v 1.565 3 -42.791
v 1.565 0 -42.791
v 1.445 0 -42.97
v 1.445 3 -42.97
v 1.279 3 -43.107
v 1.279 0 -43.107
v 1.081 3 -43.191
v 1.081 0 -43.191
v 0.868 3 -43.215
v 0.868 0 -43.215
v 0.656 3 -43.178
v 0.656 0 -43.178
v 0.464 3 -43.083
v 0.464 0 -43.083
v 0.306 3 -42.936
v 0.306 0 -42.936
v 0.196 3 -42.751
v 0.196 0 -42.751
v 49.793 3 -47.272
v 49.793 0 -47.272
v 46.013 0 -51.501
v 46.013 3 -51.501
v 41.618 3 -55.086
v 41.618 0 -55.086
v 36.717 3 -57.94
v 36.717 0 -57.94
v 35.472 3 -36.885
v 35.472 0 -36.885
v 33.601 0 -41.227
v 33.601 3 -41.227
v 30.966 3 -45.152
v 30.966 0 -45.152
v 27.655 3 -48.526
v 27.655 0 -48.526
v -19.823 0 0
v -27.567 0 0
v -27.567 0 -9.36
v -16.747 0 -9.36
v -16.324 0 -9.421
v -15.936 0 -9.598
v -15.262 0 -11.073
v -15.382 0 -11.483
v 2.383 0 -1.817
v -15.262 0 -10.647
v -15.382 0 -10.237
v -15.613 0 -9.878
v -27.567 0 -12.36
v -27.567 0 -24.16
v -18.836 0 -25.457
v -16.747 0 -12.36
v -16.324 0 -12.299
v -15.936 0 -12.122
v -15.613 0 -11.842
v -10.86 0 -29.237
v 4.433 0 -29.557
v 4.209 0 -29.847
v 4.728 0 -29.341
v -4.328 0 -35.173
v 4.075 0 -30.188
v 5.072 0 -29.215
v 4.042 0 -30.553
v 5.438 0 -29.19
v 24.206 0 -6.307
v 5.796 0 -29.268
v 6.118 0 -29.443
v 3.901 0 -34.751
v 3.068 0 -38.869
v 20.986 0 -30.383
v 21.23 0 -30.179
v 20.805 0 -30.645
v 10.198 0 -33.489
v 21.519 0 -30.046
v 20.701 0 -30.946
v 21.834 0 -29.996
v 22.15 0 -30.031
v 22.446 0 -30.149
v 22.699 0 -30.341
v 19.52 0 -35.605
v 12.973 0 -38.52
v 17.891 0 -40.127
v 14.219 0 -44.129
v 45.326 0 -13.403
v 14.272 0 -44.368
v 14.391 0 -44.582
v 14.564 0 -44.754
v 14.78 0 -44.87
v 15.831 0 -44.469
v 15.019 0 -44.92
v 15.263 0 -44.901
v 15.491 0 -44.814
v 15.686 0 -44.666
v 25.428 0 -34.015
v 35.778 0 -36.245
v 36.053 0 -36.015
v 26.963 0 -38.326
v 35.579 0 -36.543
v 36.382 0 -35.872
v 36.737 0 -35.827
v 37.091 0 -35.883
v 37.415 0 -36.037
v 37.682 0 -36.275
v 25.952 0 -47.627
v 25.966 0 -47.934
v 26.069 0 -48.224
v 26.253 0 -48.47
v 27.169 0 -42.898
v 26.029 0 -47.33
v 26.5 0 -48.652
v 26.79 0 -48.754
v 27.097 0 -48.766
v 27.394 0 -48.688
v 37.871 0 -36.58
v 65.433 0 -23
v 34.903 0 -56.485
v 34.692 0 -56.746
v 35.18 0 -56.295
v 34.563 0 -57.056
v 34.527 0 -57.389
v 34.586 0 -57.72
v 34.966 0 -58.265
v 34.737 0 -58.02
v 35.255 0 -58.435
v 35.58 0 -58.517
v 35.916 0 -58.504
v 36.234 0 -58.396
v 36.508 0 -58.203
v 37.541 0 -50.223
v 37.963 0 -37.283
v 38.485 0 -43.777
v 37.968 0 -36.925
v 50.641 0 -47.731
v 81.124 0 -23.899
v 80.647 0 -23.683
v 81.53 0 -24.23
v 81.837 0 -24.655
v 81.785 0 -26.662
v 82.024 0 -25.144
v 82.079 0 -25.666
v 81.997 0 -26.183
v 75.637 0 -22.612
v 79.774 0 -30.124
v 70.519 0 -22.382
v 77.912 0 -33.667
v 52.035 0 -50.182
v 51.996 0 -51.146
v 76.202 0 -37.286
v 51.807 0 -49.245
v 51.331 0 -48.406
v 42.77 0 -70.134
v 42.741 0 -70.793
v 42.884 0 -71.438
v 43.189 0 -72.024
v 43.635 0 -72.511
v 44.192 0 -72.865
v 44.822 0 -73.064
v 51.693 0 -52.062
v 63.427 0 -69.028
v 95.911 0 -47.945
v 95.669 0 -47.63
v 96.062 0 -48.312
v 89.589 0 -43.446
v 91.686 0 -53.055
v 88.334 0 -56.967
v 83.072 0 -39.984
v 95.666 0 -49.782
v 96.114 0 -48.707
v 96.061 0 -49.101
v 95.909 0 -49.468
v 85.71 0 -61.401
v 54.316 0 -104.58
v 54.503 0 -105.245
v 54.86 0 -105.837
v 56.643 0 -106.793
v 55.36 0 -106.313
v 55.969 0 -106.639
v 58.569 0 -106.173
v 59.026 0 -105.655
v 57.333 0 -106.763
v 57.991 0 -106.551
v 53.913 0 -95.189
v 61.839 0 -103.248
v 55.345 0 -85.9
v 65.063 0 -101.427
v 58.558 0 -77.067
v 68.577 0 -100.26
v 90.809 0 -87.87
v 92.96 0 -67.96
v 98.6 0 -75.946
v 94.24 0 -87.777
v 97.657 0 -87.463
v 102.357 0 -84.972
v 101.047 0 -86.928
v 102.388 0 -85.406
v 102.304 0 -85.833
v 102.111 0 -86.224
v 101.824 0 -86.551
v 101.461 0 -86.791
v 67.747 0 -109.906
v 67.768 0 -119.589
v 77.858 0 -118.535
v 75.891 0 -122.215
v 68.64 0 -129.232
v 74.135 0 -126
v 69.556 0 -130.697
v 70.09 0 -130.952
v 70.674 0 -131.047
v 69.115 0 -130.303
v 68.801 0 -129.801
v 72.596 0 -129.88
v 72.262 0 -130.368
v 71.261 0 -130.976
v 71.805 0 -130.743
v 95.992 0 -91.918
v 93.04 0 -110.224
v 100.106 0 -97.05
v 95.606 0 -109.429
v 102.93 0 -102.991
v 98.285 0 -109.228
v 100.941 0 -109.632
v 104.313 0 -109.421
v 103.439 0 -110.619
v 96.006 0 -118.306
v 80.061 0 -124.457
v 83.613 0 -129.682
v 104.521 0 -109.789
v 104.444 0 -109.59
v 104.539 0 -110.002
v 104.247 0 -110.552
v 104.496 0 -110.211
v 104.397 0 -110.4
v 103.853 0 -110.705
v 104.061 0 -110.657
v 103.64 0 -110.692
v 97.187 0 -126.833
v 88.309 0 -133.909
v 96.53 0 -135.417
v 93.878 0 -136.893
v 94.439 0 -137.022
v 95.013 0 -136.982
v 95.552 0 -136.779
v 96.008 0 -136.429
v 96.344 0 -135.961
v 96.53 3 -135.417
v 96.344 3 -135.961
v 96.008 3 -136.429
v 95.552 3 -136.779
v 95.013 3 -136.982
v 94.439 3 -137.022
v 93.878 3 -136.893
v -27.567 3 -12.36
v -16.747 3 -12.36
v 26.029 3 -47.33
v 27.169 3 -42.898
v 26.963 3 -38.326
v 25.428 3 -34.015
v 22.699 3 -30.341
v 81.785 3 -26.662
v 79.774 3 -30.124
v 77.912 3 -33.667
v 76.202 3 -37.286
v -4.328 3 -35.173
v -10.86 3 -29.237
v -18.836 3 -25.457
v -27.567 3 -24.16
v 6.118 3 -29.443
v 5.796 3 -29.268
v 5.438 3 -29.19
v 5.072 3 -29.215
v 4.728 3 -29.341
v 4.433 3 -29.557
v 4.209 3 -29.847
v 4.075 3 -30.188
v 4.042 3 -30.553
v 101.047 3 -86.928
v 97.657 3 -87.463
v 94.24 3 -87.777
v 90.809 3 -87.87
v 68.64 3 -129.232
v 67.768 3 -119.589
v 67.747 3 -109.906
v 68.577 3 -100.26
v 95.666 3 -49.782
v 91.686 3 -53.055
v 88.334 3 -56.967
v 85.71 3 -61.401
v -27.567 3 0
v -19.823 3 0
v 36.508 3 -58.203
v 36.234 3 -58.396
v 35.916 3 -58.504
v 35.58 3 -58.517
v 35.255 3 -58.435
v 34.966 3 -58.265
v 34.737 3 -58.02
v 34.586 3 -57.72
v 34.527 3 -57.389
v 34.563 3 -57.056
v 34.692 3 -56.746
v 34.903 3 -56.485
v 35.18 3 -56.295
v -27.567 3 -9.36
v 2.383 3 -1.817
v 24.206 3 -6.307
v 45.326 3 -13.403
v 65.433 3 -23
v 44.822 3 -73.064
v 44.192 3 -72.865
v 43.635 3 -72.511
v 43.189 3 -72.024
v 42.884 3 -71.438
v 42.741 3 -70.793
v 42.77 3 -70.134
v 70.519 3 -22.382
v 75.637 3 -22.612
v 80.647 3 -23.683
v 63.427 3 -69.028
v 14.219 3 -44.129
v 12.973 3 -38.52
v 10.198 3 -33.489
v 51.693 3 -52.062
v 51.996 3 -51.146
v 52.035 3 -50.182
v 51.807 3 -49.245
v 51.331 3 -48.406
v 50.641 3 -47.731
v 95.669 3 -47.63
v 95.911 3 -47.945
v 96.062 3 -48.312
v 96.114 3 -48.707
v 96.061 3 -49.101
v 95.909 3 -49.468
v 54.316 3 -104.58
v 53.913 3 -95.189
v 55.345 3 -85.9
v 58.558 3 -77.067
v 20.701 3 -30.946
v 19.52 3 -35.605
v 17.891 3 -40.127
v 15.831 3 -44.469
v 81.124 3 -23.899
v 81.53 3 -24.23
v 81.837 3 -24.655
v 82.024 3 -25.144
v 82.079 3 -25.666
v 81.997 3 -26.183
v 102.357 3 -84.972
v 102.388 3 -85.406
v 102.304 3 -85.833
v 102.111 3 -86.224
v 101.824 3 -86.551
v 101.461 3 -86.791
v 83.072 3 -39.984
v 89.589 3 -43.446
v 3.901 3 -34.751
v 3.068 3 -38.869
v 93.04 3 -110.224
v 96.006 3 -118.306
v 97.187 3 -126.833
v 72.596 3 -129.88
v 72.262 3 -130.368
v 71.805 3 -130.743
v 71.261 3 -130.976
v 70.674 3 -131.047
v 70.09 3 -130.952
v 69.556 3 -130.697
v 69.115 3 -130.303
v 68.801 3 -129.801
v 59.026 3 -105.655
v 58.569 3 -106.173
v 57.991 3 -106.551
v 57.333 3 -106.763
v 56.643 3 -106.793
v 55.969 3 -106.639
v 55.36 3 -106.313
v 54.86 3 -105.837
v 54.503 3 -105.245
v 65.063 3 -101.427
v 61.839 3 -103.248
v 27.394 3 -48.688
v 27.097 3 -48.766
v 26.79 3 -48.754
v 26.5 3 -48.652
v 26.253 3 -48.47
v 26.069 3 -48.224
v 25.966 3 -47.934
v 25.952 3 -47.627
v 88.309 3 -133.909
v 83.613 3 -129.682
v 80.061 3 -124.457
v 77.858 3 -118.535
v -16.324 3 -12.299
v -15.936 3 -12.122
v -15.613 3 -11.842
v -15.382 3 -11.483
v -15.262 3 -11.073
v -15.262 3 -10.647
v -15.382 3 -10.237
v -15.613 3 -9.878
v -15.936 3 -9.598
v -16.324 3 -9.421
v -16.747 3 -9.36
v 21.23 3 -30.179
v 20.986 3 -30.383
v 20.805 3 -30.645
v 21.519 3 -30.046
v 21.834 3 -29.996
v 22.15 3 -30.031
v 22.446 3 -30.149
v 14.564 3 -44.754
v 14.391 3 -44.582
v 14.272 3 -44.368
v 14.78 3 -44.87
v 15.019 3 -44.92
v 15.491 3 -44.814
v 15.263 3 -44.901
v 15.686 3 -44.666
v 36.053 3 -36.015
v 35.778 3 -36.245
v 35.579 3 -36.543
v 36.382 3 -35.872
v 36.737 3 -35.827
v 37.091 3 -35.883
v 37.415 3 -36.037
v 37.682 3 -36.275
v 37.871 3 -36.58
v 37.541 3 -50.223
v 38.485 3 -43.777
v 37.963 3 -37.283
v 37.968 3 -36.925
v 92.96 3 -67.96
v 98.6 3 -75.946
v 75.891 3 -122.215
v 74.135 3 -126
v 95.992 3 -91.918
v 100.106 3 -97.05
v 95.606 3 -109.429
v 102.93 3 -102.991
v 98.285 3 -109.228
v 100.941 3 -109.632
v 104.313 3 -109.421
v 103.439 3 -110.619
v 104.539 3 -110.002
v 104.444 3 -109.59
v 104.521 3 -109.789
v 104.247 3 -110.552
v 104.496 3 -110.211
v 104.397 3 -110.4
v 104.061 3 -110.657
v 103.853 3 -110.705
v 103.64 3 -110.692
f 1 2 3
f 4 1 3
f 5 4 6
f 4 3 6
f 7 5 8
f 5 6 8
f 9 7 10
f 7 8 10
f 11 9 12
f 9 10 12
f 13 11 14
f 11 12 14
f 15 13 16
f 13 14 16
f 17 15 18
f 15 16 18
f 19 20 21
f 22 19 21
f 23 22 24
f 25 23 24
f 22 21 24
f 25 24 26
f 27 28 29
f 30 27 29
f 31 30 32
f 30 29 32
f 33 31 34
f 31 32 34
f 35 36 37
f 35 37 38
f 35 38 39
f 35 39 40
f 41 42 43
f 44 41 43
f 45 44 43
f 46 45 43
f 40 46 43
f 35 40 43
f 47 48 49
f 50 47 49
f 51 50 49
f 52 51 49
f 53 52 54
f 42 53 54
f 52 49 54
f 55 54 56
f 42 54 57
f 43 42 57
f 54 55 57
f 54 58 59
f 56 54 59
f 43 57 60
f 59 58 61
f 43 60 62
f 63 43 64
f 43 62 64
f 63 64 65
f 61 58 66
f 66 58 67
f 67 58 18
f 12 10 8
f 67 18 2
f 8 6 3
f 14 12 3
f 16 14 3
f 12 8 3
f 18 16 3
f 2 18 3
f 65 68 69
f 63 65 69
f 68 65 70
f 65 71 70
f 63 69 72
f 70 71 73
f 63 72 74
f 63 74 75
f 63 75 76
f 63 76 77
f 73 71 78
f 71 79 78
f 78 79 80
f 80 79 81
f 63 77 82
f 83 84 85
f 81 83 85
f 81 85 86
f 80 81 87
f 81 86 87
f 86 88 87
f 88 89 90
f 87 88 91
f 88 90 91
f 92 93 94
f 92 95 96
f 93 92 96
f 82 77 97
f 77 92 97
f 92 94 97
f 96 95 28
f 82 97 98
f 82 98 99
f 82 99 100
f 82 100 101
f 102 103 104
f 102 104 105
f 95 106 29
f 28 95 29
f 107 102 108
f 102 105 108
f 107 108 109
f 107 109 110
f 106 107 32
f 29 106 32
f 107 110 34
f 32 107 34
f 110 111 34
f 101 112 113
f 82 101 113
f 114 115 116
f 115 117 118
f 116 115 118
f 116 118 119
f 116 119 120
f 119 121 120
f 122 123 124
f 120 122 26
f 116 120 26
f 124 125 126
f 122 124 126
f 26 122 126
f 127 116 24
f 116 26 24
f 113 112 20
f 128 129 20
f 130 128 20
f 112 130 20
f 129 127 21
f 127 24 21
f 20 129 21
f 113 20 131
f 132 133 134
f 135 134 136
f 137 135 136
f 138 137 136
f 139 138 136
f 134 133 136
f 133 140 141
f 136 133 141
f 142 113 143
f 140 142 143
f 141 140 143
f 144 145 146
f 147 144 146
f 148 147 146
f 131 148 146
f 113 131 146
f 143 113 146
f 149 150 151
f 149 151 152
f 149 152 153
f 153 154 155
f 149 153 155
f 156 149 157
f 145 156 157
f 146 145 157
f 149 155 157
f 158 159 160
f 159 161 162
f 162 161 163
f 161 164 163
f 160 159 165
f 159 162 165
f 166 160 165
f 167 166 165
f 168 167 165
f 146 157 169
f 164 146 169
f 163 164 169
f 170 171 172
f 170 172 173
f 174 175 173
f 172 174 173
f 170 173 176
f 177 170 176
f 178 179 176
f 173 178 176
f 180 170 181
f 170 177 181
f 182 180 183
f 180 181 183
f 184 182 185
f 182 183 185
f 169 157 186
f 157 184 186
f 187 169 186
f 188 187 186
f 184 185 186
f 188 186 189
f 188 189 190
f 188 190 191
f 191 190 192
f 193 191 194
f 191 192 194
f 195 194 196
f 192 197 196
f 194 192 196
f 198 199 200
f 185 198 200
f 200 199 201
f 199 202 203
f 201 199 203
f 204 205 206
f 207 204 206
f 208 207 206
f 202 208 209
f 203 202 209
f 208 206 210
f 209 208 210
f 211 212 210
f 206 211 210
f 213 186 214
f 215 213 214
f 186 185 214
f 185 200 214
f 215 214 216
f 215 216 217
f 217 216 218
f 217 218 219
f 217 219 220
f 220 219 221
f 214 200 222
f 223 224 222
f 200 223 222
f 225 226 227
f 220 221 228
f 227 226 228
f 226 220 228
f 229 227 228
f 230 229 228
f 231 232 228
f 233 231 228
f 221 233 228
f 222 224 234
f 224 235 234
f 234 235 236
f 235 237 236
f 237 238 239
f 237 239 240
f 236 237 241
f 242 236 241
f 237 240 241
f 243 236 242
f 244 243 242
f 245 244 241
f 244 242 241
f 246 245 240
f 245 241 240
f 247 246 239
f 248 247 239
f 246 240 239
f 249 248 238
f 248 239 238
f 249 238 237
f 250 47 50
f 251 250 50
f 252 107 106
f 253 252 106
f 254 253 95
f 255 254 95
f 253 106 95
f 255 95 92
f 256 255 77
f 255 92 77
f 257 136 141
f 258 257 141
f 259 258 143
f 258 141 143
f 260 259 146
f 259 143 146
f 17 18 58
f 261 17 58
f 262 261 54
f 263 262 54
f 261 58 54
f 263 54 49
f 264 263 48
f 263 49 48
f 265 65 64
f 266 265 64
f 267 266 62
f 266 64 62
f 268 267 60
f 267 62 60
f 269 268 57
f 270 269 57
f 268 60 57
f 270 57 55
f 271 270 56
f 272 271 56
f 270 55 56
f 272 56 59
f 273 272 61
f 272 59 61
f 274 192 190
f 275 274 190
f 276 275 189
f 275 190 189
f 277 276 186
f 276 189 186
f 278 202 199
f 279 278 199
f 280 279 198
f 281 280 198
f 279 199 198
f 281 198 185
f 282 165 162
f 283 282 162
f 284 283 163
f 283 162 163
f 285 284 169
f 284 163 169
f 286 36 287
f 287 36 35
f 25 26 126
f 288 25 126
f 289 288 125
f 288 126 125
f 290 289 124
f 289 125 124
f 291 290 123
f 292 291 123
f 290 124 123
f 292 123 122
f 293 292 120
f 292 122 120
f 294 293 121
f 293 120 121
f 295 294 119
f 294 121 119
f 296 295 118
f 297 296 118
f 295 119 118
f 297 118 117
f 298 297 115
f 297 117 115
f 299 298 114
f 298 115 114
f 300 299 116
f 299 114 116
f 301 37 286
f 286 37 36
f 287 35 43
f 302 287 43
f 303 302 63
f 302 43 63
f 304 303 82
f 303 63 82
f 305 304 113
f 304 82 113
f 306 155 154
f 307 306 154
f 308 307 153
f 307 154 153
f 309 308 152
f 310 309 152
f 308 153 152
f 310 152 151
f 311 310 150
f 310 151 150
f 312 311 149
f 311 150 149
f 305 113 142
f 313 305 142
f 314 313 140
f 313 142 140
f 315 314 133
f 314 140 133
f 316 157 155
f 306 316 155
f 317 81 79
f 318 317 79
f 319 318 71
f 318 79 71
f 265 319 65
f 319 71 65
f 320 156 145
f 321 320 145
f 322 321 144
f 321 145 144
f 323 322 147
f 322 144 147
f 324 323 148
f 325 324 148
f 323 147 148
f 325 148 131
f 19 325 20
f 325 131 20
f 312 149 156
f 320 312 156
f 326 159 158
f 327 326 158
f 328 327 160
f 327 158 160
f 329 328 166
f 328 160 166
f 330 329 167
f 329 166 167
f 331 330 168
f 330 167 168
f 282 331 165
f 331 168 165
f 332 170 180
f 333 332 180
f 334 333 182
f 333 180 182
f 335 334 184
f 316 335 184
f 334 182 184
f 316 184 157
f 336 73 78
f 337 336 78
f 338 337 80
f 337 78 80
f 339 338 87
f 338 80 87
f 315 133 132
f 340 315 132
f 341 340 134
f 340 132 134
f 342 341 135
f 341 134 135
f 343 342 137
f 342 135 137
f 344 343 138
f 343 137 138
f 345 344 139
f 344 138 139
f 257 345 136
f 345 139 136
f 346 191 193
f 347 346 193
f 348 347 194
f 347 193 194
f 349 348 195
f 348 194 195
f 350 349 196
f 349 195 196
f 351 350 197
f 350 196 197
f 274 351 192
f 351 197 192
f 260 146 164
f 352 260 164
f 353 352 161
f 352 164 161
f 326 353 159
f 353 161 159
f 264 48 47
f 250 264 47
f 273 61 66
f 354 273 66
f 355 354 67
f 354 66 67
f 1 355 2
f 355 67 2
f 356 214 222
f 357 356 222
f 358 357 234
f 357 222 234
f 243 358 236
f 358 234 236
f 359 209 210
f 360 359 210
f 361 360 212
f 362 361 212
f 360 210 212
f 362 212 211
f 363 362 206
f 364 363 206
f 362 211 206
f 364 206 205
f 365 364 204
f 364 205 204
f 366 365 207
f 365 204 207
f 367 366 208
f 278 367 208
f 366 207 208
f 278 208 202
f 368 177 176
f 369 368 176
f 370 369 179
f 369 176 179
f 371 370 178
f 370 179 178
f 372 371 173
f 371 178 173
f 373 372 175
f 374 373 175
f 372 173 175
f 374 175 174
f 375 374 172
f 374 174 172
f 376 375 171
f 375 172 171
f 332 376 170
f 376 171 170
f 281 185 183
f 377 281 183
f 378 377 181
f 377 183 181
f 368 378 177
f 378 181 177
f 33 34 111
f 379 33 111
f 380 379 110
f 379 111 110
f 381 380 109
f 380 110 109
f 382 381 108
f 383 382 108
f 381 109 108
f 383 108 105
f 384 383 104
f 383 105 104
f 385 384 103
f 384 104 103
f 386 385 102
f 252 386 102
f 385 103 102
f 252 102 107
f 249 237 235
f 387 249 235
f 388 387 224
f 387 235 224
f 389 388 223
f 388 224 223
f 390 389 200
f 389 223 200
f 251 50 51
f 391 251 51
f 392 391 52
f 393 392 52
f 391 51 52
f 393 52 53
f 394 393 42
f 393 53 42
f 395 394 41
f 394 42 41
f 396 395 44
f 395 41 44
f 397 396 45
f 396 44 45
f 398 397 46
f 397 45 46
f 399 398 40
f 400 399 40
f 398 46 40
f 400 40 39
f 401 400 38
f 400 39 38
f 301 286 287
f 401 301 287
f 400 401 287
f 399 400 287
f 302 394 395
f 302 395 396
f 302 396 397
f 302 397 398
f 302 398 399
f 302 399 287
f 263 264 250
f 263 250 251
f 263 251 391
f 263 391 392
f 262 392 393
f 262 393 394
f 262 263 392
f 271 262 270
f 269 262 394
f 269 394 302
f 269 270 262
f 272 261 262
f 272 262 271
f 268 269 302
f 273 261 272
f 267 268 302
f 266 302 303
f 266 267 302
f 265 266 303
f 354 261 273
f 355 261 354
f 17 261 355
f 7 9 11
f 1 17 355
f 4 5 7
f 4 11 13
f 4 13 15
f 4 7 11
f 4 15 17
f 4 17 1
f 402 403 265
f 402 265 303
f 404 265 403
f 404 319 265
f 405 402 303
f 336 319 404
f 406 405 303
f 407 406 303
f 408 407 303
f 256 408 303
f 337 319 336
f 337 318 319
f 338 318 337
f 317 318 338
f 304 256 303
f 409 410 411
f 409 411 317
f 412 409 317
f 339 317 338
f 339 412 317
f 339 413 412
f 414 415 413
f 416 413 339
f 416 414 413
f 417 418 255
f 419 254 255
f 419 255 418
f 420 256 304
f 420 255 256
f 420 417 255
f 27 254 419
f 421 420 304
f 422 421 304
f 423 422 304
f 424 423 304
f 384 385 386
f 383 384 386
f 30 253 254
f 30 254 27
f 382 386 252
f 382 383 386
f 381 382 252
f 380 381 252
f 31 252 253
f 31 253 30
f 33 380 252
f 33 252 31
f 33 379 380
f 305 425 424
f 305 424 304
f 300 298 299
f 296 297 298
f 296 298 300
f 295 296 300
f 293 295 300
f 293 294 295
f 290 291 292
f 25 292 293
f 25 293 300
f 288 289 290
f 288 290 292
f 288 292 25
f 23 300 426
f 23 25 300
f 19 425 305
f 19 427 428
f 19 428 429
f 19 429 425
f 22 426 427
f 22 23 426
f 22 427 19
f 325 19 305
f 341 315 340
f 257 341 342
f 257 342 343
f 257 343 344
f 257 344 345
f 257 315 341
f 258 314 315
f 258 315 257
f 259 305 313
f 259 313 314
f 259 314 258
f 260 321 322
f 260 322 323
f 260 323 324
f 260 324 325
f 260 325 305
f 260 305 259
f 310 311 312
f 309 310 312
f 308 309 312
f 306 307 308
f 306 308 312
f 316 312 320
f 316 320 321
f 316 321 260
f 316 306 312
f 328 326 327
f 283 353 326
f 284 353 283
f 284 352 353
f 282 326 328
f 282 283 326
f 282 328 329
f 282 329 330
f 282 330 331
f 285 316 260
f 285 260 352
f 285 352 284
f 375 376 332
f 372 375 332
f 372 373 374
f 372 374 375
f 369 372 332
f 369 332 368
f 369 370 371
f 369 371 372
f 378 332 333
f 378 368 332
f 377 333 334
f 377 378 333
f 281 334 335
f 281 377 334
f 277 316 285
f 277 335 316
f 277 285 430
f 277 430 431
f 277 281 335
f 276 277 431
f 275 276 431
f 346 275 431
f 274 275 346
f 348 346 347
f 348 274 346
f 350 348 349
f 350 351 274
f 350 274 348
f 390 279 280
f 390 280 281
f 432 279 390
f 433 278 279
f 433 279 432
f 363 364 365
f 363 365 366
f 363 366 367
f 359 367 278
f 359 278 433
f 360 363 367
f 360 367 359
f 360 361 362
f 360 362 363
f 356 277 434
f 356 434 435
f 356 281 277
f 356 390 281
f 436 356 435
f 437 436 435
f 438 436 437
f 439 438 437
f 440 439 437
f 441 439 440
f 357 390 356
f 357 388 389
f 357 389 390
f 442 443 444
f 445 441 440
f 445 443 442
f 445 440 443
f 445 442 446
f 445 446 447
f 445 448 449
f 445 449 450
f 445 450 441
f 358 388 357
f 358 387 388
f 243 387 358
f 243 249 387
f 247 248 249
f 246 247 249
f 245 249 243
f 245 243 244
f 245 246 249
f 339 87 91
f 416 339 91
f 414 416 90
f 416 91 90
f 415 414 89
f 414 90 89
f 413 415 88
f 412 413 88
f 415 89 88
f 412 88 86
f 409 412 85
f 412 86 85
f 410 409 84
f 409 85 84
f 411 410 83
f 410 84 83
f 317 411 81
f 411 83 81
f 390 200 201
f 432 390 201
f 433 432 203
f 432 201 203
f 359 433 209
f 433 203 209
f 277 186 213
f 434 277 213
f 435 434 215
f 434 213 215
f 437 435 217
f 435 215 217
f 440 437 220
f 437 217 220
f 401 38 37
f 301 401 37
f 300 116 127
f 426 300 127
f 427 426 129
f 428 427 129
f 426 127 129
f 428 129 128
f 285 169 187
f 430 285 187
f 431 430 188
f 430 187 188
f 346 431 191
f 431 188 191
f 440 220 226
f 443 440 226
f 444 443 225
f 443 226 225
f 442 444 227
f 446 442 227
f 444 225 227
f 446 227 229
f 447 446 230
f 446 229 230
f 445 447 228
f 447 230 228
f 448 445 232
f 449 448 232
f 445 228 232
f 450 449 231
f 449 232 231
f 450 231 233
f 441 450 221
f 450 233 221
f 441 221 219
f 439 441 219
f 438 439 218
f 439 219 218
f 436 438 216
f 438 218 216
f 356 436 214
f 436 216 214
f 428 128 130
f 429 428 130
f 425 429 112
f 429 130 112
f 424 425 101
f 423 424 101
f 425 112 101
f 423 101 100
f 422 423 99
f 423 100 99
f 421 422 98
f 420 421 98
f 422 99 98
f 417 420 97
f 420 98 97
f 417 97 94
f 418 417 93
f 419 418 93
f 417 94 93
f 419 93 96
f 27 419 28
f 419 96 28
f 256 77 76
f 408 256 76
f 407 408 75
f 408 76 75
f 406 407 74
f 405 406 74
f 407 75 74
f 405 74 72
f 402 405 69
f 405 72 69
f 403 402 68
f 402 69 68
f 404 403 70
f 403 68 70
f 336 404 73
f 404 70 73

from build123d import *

# Parameters (mm, degrees)
BOSS_EXTRUDE1_DEPTH = 3


with BuildPart() as part:
    # Sketch1 → Boss-Extrude1 (new body)
    with BuildSketch(Plane(origin=(0, 0, 0), x_dir=(1, 0, 0), z_dir=(0, 1, 0))):
        with BuildLine():
            Line((-27.566533023, 9.36), (-27.566533023, 0))
            Line((-27.566533023, 0), (-19.823403694, 0))
            ThreePointArc((-19.823403694, 0), (24.20597109, 6.306968985), (65.433466977, 23))
            ThreePointArc((65.433466977, 23), (73.082886665, 22.390495512), (80.646880945, 23.683208869))
            ThreePointArc((80.646880945, 23.683208869), (81.946672363, 24.893615616), (81.784737476, 26.662321164))
            ThreePointArc((81.784737476, 26.662321164), (78.82438559, 31.885442154), (76.202135766, 37.28622747))
            ThreePointArc((76.202135766, 37.28622747), (86.37958616, 41.621825), (95.668579031, 47.629529544))
            ThreePointArc((95.668579031, 47.629529544), (96.113926531, 48.706505439), (95.666017221, 49.782418412))
            ThreePointArc((95.666017221, 49.782418412), (89.924608564, 54.937742393), (85.709789242, 61.401211803))
            ThreePointArc((85.709789242, 61.401211803), (96.000732533, 71.797200989), (102.357305132, 84.971952969))
            ThreePointArc((102.357305132, 84.971952969), (102.11128314, 86.223857216), (101.047487459, 86.928222044))
            ThreePointArc((101.047487459, 86.928222044), (95.950995205, 87.647987285), (90.808707622, 87.869738741))
            ThreePointArc((90.808707622, 87.869738741), (100.106213422, 97.05037675), (104.313081391, 109.420905852))
            ThreePointArc((104.313081391, 109.420905852), (104.396564886, 110.399625231), (103.439203659, 110.619444698))
            ThreePointArc((103.439203659, 110.619444698), (98.285170112, 109.227963636), (93.040390076, 110.224238556))
            ThreePointArc((93.040390076, 110.224238556), (96.824995658, 122.538102913), (96.530215503, 135.417062479))
            ThreePointArc((96.530215503, 135.417062479), (95.551508519, 136.778926007), (93.878347384, 136.893256429))
            ThreePointArc((93.878347384, 136.893256429), (83.613278323, 129.68205398), (77.858466896, 118.535071023))
            ThreePointArc((77.858466896, 118.535071023), (74.985694546, 124.095226744), (72.596248771, 129.879576449))
            ThreePointArc((72.596248771, 129.879576449), (70.378357546, 131.020039942), (68.639848531, 129.231944623))
            ThreePointArc((68.639848531, 129.231944623), (67.651272843, 114.747827583), (68.577278714, 100.25957574))
            ThreePointArc((68.577278714, 100.25957574), (63.407288288, 102.259220756), (59.026108144, 105.655195101))
            ThreePointArc((59.026108144, 105.655195101), (56.300849607, 106.738729111), (54.315586254, 104.580069929))
            ThreePointArc((54.315586254, 104.580069929), (55.34526323, 85.900059583), (63.427341461, 69.02750694))
            Line((63.427341461, 69.02750694), (44.822180162, 73.063888147))
            ThreePointArc((44.822180162, 73.063888147), (43.189327409, 72.023710618), (42.770208924, 70.133600278))
            Line((42.770208924, 70.133600278), (51.693414268, 52.061516653))
            ThreePointArc((51.693414268, 52.061516653), (51.807398335, 49.244580753), (49.792960169, 47.272232126))
            ThreePointArc((49.792960169, 47.272232126), (43.886083409, 53.379891607), (36.716738418, 57.940065925))
            ThreePointArc((36.716738418, 57.940065925), (34.842559279, 58.150522241), (35.17981611, 56.294963797))
            ThreePointArc((35.17981611, 56.294963797), (38.195000716, 47.026649531), (37.963262453, 37.282970301))
            ThreePointArc((37.963262453, 37.282970301), (36.915972263, 35.842205611), (35.471592941, 36.884504997))
            ThreePointArc((35.471592941, 36.884504997), (32.374331301, 43.249850807), (27.655103234, 48.526169922))
            ThreePointArc((27.655103234, 48.526169922), (26.369610718, 48.570167749), (26.028819046, 47.329890419))
            ThreePointArc((26.028819046, 47.329890419), (26.962894841, 38.326203111), (22.69935772, 30.341146196))
            ThreePointArc((22.69935772, 30.341146196), (21.519458622, 30.046407872), (20.701006485, 30.9459459))
            ThreePointArc((20.701006485, 30.9459459), (18.760748853, 37.885894085), (15.830732782, 44.469395153))
            ThreePointArc((15.830732782, 44.469395153), (14.897444009, 44.903650637), (14.219241967, 44.129281378))
            ThreePointArc((14.219241967, 44.129281378), (11.765539078, 35.905199886), (6.117654668, 29.443189676))
            ThreePointArc((6.117654668, 29.443189676), (4.728143423, 29.340639166), (4.041804517, 30.553155976))
            ThreePointArc((4.041804517, 30.553155976), (3.570156048, 36.827406443), (1.56510947, 42.791336307))
            ThreePointArc((1.56510947, 42.791336307), (0.867859685, 43.215318025), (0.196498979, 42.751429503))
            ThreePointArc((0.196498979, 42.751429503), (-10.860043289, 29.237113049), (-27.566533023, 24.16))
            Line((-27.566533023, 24.16), (-27.566533023, 12.36))
            Line((-27.566533023, 12.36), (-16.746533023, 12.36))
            ThreePointArc((-16.746533023, 12.36), (-15.246533023, 10.86), (-16.746533023, 9.36))
            Line((-16.746533023, 9.36), (-27.566533023, 9.36))
        make_face()
    extrude(amount=BOSS_EXTRUDE1_DEPTH)


solid = part.part
